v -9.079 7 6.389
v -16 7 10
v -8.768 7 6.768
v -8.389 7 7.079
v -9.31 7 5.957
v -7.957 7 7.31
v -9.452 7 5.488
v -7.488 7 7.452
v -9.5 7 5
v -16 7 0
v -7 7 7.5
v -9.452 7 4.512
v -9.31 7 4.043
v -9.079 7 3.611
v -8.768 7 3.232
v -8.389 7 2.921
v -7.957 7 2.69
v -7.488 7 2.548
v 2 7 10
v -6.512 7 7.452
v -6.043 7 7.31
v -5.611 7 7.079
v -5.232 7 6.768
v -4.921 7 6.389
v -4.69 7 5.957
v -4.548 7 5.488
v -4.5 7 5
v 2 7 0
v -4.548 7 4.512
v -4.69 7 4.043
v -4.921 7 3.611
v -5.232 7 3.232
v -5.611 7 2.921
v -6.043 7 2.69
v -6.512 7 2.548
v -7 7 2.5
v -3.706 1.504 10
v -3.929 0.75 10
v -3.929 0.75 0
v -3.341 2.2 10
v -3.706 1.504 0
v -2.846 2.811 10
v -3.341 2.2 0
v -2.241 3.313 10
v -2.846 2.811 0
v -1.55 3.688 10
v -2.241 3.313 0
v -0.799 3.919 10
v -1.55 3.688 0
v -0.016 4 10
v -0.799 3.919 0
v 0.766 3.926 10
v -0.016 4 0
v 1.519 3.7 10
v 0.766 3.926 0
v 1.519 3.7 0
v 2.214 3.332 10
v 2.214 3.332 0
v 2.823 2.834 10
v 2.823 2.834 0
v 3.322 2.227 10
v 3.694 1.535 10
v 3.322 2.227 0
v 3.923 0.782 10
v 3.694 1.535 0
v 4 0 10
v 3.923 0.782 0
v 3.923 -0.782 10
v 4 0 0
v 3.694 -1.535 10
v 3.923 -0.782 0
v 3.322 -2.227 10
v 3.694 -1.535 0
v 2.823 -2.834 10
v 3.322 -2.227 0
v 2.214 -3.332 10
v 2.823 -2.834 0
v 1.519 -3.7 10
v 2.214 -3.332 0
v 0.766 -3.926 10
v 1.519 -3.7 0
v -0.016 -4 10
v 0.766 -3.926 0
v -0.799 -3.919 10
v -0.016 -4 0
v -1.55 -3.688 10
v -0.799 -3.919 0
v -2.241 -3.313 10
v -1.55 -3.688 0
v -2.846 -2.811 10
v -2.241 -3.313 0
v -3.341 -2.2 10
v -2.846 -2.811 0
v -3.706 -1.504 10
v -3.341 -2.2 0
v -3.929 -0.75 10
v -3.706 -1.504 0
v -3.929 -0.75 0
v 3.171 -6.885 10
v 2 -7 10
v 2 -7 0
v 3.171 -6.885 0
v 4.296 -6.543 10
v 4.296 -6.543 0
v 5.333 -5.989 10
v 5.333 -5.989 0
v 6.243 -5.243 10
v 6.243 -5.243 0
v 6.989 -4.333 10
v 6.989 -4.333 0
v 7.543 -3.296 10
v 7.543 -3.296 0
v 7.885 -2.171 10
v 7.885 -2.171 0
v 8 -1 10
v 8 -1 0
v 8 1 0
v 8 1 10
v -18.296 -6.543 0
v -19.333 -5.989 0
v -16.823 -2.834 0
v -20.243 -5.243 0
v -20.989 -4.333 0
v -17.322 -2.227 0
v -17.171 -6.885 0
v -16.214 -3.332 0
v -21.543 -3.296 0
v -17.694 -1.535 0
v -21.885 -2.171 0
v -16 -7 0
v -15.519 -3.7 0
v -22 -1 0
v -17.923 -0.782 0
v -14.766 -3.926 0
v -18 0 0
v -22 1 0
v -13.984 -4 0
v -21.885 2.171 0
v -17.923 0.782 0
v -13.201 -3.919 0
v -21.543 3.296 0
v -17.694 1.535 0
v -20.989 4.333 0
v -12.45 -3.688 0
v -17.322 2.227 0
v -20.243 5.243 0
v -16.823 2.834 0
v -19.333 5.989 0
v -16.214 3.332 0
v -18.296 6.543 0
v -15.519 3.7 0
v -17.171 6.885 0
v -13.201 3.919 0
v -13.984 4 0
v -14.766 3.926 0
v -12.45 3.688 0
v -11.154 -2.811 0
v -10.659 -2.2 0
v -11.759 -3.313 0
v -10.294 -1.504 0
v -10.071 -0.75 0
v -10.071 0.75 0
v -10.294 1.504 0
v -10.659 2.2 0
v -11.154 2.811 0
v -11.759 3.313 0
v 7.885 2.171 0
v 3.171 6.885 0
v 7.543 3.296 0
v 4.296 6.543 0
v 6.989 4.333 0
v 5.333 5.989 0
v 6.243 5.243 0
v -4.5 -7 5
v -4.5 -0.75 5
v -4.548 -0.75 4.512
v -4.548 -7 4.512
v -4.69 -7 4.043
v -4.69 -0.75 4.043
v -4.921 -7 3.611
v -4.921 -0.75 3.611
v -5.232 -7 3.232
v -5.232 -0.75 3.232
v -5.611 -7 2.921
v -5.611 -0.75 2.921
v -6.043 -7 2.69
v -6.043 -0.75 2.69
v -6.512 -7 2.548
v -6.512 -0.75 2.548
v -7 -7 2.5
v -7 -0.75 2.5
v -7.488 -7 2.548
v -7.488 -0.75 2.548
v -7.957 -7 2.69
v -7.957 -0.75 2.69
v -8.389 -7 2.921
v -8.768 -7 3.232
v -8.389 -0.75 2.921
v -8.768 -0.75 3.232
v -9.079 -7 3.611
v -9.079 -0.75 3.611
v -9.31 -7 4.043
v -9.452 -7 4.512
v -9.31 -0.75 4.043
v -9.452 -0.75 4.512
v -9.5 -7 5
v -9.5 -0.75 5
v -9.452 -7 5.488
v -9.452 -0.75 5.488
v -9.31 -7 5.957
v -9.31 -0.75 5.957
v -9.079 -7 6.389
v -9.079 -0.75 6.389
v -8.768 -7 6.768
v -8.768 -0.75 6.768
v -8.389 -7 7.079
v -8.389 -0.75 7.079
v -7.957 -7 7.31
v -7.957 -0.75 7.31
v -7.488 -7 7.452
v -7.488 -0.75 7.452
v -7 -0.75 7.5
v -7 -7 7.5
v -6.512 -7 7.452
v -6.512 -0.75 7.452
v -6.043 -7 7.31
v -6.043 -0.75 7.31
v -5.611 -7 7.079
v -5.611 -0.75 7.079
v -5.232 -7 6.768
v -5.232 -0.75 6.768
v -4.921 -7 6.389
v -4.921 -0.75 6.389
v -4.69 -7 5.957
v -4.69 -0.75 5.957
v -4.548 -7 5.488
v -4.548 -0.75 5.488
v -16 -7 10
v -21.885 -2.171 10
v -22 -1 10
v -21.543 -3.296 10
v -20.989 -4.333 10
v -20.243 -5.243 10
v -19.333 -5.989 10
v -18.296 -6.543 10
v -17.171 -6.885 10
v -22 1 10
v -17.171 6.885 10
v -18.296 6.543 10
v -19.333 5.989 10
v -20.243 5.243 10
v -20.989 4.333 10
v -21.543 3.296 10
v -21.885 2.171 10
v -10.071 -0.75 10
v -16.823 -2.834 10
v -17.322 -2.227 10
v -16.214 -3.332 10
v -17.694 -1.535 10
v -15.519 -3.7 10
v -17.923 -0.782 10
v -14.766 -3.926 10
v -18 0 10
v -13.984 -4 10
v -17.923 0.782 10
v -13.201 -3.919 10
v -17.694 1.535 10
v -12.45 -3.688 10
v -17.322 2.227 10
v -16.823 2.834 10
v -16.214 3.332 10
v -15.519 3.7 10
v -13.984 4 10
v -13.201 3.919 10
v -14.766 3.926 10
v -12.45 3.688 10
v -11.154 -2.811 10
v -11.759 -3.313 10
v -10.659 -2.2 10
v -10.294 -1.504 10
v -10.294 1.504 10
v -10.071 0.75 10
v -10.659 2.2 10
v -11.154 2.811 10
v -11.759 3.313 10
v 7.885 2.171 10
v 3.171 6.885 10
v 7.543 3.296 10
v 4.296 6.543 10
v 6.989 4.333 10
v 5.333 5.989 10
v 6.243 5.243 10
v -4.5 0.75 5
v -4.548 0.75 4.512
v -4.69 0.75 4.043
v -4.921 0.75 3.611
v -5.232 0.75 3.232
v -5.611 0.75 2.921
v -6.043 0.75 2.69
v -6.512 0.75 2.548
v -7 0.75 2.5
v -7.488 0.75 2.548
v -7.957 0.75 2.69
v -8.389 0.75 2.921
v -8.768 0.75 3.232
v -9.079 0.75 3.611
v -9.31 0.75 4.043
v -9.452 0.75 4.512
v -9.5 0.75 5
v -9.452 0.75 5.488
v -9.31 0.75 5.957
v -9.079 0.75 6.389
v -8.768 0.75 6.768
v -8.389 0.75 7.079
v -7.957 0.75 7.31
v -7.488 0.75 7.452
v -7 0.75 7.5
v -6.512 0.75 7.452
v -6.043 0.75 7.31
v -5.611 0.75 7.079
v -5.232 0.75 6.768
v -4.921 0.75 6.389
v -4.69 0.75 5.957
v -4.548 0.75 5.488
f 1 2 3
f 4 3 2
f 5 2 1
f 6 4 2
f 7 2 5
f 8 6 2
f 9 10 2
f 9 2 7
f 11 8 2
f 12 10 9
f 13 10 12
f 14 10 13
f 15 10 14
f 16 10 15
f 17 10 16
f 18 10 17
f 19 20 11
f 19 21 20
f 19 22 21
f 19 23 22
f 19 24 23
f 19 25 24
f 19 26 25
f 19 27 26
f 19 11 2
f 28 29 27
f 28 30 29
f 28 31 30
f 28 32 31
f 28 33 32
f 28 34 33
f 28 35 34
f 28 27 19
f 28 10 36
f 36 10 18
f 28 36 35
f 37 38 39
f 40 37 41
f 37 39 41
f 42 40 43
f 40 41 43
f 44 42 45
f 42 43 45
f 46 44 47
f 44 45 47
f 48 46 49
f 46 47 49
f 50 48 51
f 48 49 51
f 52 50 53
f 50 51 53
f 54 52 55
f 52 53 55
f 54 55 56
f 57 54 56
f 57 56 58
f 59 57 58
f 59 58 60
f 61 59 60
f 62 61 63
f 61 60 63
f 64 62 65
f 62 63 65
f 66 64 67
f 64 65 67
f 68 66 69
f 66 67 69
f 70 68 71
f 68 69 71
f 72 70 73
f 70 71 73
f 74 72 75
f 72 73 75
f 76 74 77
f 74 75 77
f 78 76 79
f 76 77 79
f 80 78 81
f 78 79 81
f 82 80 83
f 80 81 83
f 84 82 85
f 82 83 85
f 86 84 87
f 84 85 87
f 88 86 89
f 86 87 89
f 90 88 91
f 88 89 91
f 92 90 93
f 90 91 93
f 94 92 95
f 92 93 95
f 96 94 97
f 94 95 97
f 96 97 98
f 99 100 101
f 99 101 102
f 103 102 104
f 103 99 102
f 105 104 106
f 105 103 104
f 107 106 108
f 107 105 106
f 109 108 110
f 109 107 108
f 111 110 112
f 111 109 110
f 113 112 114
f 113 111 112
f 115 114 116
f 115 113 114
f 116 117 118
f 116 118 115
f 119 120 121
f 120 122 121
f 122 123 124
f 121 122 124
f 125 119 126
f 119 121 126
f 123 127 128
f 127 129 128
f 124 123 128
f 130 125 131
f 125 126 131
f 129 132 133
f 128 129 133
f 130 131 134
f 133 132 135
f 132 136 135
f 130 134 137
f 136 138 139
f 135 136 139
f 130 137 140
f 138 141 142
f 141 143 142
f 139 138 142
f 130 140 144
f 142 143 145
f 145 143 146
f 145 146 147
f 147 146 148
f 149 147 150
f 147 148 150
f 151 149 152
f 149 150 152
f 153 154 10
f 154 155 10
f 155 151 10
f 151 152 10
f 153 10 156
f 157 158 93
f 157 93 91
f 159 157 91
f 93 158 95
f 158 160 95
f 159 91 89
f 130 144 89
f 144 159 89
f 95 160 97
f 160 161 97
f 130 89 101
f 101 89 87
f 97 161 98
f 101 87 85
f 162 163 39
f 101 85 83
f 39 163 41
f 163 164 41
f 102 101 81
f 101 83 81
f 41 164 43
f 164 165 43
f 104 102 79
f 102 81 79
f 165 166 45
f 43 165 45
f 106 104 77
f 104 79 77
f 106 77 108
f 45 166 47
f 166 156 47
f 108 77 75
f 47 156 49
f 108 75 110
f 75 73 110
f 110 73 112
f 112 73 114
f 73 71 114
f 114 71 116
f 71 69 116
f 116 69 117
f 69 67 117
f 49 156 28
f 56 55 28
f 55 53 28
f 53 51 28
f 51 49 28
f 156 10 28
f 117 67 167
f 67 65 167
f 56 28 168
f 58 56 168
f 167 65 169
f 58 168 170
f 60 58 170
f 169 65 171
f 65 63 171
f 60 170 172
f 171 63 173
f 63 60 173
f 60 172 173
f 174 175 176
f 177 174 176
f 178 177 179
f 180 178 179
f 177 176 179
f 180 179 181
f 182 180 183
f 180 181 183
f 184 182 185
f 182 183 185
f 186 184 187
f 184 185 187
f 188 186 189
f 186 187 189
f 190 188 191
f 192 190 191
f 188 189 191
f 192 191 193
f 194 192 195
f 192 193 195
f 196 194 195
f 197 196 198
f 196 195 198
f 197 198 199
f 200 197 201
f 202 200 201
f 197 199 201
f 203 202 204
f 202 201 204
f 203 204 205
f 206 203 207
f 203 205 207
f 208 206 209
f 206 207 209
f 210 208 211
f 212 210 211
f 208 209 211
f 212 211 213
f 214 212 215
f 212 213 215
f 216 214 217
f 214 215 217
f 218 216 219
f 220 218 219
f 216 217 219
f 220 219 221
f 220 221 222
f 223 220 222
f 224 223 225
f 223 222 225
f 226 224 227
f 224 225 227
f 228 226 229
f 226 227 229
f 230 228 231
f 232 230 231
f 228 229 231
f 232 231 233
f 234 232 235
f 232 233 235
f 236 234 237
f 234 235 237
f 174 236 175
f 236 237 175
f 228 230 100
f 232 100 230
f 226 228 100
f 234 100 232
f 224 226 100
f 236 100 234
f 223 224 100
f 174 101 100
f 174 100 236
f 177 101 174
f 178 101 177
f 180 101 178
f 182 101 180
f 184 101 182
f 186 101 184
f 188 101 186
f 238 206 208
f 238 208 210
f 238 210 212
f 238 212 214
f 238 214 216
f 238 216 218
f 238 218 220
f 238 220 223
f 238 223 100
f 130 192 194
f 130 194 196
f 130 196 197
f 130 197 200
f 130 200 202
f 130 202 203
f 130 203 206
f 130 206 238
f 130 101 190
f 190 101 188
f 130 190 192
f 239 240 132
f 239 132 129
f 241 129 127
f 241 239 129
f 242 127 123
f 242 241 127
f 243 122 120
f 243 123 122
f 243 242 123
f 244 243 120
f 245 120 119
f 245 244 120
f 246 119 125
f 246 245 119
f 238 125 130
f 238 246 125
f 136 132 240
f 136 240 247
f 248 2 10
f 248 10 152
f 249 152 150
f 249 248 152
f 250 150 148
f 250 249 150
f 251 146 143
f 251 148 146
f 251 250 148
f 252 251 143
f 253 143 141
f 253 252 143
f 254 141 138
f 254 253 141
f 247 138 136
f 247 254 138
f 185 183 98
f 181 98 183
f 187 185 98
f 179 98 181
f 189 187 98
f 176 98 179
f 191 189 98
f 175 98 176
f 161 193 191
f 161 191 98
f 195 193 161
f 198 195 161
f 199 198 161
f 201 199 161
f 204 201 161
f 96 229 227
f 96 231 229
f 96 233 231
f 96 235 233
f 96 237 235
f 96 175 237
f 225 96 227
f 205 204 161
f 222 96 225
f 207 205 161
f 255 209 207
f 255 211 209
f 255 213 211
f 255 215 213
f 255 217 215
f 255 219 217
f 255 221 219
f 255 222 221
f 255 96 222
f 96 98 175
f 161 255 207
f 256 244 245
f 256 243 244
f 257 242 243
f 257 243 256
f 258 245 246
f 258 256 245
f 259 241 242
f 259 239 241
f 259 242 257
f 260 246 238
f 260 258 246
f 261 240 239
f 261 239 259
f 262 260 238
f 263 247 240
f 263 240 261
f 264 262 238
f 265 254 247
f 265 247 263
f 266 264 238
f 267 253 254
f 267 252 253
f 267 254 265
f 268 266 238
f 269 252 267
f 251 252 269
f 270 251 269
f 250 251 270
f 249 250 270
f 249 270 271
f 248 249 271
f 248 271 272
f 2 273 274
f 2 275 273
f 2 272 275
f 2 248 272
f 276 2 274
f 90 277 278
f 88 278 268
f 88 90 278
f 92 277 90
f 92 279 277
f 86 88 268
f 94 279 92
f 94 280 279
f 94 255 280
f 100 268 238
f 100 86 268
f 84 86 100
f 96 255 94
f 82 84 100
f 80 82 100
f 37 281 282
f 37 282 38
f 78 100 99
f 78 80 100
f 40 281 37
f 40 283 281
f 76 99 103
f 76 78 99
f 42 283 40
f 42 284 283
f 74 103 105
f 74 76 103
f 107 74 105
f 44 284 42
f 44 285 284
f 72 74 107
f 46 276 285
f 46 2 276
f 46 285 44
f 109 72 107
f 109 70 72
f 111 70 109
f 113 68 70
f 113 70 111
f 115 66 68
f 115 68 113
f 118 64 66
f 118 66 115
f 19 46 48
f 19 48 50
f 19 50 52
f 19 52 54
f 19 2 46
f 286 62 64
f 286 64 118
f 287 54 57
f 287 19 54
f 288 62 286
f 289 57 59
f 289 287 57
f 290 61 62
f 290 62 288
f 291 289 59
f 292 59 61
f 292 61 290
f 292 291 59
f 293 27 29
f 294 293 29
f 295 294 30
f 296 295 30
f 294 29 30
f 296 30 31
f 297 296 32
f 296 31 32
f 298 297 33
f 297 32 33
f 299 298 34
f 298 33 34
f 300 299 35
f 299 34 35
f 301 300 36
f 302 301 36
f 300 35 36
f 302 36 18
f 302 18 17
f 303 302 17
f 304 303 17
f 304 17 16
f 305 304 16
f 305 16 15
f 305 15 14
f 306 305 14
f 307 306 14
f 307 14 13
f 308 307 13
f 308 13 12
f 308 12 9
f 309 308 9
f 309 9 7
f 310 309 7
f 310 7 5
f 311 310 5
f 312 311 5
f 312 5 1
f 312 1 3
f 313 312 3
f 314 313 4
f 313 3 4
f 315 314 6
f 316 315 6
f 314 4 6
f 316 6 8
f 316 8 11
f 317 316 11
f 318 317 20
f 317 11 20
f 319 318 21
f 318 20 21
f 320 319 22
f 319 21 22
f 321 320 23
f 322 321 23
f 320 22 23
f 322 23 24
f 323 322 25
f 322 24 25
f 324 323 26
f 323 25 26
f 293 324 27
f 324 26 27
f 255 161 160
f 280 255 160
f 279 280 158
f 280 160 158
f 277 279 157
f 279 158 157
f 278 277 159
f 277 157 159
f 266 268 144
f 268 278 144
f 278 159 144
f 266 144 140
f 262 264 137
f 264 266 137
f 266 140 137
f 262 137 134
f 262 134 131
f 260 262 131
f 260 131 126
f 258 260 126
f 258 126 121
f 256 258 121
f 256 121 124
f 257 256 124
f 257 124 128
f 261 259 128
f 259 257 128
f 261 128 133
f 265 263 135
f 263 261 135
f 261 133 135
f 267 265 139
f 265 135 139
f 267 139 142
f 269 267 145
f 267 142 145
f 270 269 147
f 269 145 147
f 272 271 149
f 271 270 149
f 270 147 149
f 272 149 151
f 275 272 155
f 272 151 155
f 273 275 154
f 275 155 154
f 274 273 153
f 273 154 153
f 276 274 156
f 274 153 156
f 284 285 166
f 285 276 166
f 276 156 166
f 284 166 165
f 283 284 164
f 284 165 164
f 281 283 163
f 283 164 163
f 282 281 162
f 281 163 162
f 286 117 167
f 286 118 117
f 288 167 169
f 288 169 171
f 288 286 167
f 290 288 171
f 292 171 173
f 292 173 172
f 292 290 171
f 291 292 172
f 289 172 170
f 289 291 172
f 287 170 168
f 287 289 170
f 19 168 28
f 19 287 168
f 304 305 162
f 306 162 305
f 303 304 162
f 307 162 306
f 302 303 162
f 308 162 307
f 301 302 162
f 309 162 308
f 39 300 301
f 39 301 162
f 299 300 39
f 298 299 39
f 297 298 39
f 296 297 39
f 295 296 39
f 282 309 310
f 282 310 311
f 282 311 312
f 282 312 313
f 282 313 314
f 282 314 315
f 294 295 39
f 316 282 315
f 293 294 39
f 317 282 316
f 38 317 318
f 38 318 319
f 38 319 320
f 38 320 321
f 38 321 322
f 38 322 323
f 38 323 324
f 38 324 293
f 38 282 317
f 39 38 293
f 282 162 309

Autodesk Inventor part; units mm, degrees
ref_plane "YZ Plane" through (0, 0, 0) normal (1, 0, 0) x (0, 1, 0)
ref_plane "XZ Plane" through (0, 0, 0) normal (0, 1, 0) x (-1, 0, 0)
ref_plane "XY Plane" through (0, 0, 0) normal (0, 0, 1) x (1, 0, 0)
sketch "Sketch1" plane through (0, 0, 0) normal (0, 0, 1) x (1, 0, 0)
  line L0 (0, 0) -> (-14, 0) construction
  circle A0 centre (-14, 0) radius 4
  circle A1 centre (0, 0) radius 4
  line L1 (8, -7) -> (-22, -7)
  line L2 (-22, -7) -> (-22, 7)
  line L3 (-22, 7) -> (8, 7)
  line L4 (8, 7) -> (8, -7)
  line L5 (8, -7) -> (-22, 7) construction
  line L6 (-22, -7) -> (8, 7) construction
  point P0 (-7, 0)
  dimension "d0" = 8
  dimension "d1" = 14
  dimension "d2" = 8
  dimension "d3" = 14
  dimension "d13" = 30
extrude "Extrusion1" add sketch "Sketch1" along normal blind 10
sketch "Sketch2" plane through (-22, 7, 0) normal (0, 1, 0) x (1, 0, 0)
  line L0 (0, 0) -> (30, 0) projected
  line L1 (30, -10) -> (0, -10) projected
  line L2 (15, 0) -> (15, -10) construction
  circle A0 centre (15, -5) radius 2.5
  point P0 (22, 0)
  dimension "d6" = 5
extrude "Extrusion2" cut sketch "Sketch2" against normal through all
fillet "Fillet1" radius 6 4 edges at (8, 7, 5) (-22, 7, 5) (-22, -7, 5) (8, -7, 5)
sketch "Sketch3" plane through (0, 0, 10) normal (0, 0, 1) x (1, 0, 0)
  line L0 (-16, -7) -> (2, -7) projected
  circle A0 centre (0, 0) radius 4 projected
  circle A1 centre (-14, 0) radius 4 projected
  line L1 (-14, 0) -> (0, 0) construction
  line L2 (0, -0.75) -> (-14, -0.75)
  line L3 (-14, -0.75) -> (-14, 0.75)
  line L4 (-14, 0.75) -> (0, 0.75)
  line L5 (0, 0.75) -> (0, -0.75)
  line L6 (0, -0.75) -> (-14, 0.75) construction
  line L7 (-14, -0.75) -> (0, 0.75) construction
  point P0 (-7, 0)
  dimension "d10" = 1.5
extrude "Extrusion3" cut sketch "Sketch3" against normal through all contours L4 L5 L2 A0 | A0 L2 A1 L4 | A1 L2 L3 L4 picked at (-1.3307, -0.0838) picked at (-12.6667, 0)
properties part number "crank web"
